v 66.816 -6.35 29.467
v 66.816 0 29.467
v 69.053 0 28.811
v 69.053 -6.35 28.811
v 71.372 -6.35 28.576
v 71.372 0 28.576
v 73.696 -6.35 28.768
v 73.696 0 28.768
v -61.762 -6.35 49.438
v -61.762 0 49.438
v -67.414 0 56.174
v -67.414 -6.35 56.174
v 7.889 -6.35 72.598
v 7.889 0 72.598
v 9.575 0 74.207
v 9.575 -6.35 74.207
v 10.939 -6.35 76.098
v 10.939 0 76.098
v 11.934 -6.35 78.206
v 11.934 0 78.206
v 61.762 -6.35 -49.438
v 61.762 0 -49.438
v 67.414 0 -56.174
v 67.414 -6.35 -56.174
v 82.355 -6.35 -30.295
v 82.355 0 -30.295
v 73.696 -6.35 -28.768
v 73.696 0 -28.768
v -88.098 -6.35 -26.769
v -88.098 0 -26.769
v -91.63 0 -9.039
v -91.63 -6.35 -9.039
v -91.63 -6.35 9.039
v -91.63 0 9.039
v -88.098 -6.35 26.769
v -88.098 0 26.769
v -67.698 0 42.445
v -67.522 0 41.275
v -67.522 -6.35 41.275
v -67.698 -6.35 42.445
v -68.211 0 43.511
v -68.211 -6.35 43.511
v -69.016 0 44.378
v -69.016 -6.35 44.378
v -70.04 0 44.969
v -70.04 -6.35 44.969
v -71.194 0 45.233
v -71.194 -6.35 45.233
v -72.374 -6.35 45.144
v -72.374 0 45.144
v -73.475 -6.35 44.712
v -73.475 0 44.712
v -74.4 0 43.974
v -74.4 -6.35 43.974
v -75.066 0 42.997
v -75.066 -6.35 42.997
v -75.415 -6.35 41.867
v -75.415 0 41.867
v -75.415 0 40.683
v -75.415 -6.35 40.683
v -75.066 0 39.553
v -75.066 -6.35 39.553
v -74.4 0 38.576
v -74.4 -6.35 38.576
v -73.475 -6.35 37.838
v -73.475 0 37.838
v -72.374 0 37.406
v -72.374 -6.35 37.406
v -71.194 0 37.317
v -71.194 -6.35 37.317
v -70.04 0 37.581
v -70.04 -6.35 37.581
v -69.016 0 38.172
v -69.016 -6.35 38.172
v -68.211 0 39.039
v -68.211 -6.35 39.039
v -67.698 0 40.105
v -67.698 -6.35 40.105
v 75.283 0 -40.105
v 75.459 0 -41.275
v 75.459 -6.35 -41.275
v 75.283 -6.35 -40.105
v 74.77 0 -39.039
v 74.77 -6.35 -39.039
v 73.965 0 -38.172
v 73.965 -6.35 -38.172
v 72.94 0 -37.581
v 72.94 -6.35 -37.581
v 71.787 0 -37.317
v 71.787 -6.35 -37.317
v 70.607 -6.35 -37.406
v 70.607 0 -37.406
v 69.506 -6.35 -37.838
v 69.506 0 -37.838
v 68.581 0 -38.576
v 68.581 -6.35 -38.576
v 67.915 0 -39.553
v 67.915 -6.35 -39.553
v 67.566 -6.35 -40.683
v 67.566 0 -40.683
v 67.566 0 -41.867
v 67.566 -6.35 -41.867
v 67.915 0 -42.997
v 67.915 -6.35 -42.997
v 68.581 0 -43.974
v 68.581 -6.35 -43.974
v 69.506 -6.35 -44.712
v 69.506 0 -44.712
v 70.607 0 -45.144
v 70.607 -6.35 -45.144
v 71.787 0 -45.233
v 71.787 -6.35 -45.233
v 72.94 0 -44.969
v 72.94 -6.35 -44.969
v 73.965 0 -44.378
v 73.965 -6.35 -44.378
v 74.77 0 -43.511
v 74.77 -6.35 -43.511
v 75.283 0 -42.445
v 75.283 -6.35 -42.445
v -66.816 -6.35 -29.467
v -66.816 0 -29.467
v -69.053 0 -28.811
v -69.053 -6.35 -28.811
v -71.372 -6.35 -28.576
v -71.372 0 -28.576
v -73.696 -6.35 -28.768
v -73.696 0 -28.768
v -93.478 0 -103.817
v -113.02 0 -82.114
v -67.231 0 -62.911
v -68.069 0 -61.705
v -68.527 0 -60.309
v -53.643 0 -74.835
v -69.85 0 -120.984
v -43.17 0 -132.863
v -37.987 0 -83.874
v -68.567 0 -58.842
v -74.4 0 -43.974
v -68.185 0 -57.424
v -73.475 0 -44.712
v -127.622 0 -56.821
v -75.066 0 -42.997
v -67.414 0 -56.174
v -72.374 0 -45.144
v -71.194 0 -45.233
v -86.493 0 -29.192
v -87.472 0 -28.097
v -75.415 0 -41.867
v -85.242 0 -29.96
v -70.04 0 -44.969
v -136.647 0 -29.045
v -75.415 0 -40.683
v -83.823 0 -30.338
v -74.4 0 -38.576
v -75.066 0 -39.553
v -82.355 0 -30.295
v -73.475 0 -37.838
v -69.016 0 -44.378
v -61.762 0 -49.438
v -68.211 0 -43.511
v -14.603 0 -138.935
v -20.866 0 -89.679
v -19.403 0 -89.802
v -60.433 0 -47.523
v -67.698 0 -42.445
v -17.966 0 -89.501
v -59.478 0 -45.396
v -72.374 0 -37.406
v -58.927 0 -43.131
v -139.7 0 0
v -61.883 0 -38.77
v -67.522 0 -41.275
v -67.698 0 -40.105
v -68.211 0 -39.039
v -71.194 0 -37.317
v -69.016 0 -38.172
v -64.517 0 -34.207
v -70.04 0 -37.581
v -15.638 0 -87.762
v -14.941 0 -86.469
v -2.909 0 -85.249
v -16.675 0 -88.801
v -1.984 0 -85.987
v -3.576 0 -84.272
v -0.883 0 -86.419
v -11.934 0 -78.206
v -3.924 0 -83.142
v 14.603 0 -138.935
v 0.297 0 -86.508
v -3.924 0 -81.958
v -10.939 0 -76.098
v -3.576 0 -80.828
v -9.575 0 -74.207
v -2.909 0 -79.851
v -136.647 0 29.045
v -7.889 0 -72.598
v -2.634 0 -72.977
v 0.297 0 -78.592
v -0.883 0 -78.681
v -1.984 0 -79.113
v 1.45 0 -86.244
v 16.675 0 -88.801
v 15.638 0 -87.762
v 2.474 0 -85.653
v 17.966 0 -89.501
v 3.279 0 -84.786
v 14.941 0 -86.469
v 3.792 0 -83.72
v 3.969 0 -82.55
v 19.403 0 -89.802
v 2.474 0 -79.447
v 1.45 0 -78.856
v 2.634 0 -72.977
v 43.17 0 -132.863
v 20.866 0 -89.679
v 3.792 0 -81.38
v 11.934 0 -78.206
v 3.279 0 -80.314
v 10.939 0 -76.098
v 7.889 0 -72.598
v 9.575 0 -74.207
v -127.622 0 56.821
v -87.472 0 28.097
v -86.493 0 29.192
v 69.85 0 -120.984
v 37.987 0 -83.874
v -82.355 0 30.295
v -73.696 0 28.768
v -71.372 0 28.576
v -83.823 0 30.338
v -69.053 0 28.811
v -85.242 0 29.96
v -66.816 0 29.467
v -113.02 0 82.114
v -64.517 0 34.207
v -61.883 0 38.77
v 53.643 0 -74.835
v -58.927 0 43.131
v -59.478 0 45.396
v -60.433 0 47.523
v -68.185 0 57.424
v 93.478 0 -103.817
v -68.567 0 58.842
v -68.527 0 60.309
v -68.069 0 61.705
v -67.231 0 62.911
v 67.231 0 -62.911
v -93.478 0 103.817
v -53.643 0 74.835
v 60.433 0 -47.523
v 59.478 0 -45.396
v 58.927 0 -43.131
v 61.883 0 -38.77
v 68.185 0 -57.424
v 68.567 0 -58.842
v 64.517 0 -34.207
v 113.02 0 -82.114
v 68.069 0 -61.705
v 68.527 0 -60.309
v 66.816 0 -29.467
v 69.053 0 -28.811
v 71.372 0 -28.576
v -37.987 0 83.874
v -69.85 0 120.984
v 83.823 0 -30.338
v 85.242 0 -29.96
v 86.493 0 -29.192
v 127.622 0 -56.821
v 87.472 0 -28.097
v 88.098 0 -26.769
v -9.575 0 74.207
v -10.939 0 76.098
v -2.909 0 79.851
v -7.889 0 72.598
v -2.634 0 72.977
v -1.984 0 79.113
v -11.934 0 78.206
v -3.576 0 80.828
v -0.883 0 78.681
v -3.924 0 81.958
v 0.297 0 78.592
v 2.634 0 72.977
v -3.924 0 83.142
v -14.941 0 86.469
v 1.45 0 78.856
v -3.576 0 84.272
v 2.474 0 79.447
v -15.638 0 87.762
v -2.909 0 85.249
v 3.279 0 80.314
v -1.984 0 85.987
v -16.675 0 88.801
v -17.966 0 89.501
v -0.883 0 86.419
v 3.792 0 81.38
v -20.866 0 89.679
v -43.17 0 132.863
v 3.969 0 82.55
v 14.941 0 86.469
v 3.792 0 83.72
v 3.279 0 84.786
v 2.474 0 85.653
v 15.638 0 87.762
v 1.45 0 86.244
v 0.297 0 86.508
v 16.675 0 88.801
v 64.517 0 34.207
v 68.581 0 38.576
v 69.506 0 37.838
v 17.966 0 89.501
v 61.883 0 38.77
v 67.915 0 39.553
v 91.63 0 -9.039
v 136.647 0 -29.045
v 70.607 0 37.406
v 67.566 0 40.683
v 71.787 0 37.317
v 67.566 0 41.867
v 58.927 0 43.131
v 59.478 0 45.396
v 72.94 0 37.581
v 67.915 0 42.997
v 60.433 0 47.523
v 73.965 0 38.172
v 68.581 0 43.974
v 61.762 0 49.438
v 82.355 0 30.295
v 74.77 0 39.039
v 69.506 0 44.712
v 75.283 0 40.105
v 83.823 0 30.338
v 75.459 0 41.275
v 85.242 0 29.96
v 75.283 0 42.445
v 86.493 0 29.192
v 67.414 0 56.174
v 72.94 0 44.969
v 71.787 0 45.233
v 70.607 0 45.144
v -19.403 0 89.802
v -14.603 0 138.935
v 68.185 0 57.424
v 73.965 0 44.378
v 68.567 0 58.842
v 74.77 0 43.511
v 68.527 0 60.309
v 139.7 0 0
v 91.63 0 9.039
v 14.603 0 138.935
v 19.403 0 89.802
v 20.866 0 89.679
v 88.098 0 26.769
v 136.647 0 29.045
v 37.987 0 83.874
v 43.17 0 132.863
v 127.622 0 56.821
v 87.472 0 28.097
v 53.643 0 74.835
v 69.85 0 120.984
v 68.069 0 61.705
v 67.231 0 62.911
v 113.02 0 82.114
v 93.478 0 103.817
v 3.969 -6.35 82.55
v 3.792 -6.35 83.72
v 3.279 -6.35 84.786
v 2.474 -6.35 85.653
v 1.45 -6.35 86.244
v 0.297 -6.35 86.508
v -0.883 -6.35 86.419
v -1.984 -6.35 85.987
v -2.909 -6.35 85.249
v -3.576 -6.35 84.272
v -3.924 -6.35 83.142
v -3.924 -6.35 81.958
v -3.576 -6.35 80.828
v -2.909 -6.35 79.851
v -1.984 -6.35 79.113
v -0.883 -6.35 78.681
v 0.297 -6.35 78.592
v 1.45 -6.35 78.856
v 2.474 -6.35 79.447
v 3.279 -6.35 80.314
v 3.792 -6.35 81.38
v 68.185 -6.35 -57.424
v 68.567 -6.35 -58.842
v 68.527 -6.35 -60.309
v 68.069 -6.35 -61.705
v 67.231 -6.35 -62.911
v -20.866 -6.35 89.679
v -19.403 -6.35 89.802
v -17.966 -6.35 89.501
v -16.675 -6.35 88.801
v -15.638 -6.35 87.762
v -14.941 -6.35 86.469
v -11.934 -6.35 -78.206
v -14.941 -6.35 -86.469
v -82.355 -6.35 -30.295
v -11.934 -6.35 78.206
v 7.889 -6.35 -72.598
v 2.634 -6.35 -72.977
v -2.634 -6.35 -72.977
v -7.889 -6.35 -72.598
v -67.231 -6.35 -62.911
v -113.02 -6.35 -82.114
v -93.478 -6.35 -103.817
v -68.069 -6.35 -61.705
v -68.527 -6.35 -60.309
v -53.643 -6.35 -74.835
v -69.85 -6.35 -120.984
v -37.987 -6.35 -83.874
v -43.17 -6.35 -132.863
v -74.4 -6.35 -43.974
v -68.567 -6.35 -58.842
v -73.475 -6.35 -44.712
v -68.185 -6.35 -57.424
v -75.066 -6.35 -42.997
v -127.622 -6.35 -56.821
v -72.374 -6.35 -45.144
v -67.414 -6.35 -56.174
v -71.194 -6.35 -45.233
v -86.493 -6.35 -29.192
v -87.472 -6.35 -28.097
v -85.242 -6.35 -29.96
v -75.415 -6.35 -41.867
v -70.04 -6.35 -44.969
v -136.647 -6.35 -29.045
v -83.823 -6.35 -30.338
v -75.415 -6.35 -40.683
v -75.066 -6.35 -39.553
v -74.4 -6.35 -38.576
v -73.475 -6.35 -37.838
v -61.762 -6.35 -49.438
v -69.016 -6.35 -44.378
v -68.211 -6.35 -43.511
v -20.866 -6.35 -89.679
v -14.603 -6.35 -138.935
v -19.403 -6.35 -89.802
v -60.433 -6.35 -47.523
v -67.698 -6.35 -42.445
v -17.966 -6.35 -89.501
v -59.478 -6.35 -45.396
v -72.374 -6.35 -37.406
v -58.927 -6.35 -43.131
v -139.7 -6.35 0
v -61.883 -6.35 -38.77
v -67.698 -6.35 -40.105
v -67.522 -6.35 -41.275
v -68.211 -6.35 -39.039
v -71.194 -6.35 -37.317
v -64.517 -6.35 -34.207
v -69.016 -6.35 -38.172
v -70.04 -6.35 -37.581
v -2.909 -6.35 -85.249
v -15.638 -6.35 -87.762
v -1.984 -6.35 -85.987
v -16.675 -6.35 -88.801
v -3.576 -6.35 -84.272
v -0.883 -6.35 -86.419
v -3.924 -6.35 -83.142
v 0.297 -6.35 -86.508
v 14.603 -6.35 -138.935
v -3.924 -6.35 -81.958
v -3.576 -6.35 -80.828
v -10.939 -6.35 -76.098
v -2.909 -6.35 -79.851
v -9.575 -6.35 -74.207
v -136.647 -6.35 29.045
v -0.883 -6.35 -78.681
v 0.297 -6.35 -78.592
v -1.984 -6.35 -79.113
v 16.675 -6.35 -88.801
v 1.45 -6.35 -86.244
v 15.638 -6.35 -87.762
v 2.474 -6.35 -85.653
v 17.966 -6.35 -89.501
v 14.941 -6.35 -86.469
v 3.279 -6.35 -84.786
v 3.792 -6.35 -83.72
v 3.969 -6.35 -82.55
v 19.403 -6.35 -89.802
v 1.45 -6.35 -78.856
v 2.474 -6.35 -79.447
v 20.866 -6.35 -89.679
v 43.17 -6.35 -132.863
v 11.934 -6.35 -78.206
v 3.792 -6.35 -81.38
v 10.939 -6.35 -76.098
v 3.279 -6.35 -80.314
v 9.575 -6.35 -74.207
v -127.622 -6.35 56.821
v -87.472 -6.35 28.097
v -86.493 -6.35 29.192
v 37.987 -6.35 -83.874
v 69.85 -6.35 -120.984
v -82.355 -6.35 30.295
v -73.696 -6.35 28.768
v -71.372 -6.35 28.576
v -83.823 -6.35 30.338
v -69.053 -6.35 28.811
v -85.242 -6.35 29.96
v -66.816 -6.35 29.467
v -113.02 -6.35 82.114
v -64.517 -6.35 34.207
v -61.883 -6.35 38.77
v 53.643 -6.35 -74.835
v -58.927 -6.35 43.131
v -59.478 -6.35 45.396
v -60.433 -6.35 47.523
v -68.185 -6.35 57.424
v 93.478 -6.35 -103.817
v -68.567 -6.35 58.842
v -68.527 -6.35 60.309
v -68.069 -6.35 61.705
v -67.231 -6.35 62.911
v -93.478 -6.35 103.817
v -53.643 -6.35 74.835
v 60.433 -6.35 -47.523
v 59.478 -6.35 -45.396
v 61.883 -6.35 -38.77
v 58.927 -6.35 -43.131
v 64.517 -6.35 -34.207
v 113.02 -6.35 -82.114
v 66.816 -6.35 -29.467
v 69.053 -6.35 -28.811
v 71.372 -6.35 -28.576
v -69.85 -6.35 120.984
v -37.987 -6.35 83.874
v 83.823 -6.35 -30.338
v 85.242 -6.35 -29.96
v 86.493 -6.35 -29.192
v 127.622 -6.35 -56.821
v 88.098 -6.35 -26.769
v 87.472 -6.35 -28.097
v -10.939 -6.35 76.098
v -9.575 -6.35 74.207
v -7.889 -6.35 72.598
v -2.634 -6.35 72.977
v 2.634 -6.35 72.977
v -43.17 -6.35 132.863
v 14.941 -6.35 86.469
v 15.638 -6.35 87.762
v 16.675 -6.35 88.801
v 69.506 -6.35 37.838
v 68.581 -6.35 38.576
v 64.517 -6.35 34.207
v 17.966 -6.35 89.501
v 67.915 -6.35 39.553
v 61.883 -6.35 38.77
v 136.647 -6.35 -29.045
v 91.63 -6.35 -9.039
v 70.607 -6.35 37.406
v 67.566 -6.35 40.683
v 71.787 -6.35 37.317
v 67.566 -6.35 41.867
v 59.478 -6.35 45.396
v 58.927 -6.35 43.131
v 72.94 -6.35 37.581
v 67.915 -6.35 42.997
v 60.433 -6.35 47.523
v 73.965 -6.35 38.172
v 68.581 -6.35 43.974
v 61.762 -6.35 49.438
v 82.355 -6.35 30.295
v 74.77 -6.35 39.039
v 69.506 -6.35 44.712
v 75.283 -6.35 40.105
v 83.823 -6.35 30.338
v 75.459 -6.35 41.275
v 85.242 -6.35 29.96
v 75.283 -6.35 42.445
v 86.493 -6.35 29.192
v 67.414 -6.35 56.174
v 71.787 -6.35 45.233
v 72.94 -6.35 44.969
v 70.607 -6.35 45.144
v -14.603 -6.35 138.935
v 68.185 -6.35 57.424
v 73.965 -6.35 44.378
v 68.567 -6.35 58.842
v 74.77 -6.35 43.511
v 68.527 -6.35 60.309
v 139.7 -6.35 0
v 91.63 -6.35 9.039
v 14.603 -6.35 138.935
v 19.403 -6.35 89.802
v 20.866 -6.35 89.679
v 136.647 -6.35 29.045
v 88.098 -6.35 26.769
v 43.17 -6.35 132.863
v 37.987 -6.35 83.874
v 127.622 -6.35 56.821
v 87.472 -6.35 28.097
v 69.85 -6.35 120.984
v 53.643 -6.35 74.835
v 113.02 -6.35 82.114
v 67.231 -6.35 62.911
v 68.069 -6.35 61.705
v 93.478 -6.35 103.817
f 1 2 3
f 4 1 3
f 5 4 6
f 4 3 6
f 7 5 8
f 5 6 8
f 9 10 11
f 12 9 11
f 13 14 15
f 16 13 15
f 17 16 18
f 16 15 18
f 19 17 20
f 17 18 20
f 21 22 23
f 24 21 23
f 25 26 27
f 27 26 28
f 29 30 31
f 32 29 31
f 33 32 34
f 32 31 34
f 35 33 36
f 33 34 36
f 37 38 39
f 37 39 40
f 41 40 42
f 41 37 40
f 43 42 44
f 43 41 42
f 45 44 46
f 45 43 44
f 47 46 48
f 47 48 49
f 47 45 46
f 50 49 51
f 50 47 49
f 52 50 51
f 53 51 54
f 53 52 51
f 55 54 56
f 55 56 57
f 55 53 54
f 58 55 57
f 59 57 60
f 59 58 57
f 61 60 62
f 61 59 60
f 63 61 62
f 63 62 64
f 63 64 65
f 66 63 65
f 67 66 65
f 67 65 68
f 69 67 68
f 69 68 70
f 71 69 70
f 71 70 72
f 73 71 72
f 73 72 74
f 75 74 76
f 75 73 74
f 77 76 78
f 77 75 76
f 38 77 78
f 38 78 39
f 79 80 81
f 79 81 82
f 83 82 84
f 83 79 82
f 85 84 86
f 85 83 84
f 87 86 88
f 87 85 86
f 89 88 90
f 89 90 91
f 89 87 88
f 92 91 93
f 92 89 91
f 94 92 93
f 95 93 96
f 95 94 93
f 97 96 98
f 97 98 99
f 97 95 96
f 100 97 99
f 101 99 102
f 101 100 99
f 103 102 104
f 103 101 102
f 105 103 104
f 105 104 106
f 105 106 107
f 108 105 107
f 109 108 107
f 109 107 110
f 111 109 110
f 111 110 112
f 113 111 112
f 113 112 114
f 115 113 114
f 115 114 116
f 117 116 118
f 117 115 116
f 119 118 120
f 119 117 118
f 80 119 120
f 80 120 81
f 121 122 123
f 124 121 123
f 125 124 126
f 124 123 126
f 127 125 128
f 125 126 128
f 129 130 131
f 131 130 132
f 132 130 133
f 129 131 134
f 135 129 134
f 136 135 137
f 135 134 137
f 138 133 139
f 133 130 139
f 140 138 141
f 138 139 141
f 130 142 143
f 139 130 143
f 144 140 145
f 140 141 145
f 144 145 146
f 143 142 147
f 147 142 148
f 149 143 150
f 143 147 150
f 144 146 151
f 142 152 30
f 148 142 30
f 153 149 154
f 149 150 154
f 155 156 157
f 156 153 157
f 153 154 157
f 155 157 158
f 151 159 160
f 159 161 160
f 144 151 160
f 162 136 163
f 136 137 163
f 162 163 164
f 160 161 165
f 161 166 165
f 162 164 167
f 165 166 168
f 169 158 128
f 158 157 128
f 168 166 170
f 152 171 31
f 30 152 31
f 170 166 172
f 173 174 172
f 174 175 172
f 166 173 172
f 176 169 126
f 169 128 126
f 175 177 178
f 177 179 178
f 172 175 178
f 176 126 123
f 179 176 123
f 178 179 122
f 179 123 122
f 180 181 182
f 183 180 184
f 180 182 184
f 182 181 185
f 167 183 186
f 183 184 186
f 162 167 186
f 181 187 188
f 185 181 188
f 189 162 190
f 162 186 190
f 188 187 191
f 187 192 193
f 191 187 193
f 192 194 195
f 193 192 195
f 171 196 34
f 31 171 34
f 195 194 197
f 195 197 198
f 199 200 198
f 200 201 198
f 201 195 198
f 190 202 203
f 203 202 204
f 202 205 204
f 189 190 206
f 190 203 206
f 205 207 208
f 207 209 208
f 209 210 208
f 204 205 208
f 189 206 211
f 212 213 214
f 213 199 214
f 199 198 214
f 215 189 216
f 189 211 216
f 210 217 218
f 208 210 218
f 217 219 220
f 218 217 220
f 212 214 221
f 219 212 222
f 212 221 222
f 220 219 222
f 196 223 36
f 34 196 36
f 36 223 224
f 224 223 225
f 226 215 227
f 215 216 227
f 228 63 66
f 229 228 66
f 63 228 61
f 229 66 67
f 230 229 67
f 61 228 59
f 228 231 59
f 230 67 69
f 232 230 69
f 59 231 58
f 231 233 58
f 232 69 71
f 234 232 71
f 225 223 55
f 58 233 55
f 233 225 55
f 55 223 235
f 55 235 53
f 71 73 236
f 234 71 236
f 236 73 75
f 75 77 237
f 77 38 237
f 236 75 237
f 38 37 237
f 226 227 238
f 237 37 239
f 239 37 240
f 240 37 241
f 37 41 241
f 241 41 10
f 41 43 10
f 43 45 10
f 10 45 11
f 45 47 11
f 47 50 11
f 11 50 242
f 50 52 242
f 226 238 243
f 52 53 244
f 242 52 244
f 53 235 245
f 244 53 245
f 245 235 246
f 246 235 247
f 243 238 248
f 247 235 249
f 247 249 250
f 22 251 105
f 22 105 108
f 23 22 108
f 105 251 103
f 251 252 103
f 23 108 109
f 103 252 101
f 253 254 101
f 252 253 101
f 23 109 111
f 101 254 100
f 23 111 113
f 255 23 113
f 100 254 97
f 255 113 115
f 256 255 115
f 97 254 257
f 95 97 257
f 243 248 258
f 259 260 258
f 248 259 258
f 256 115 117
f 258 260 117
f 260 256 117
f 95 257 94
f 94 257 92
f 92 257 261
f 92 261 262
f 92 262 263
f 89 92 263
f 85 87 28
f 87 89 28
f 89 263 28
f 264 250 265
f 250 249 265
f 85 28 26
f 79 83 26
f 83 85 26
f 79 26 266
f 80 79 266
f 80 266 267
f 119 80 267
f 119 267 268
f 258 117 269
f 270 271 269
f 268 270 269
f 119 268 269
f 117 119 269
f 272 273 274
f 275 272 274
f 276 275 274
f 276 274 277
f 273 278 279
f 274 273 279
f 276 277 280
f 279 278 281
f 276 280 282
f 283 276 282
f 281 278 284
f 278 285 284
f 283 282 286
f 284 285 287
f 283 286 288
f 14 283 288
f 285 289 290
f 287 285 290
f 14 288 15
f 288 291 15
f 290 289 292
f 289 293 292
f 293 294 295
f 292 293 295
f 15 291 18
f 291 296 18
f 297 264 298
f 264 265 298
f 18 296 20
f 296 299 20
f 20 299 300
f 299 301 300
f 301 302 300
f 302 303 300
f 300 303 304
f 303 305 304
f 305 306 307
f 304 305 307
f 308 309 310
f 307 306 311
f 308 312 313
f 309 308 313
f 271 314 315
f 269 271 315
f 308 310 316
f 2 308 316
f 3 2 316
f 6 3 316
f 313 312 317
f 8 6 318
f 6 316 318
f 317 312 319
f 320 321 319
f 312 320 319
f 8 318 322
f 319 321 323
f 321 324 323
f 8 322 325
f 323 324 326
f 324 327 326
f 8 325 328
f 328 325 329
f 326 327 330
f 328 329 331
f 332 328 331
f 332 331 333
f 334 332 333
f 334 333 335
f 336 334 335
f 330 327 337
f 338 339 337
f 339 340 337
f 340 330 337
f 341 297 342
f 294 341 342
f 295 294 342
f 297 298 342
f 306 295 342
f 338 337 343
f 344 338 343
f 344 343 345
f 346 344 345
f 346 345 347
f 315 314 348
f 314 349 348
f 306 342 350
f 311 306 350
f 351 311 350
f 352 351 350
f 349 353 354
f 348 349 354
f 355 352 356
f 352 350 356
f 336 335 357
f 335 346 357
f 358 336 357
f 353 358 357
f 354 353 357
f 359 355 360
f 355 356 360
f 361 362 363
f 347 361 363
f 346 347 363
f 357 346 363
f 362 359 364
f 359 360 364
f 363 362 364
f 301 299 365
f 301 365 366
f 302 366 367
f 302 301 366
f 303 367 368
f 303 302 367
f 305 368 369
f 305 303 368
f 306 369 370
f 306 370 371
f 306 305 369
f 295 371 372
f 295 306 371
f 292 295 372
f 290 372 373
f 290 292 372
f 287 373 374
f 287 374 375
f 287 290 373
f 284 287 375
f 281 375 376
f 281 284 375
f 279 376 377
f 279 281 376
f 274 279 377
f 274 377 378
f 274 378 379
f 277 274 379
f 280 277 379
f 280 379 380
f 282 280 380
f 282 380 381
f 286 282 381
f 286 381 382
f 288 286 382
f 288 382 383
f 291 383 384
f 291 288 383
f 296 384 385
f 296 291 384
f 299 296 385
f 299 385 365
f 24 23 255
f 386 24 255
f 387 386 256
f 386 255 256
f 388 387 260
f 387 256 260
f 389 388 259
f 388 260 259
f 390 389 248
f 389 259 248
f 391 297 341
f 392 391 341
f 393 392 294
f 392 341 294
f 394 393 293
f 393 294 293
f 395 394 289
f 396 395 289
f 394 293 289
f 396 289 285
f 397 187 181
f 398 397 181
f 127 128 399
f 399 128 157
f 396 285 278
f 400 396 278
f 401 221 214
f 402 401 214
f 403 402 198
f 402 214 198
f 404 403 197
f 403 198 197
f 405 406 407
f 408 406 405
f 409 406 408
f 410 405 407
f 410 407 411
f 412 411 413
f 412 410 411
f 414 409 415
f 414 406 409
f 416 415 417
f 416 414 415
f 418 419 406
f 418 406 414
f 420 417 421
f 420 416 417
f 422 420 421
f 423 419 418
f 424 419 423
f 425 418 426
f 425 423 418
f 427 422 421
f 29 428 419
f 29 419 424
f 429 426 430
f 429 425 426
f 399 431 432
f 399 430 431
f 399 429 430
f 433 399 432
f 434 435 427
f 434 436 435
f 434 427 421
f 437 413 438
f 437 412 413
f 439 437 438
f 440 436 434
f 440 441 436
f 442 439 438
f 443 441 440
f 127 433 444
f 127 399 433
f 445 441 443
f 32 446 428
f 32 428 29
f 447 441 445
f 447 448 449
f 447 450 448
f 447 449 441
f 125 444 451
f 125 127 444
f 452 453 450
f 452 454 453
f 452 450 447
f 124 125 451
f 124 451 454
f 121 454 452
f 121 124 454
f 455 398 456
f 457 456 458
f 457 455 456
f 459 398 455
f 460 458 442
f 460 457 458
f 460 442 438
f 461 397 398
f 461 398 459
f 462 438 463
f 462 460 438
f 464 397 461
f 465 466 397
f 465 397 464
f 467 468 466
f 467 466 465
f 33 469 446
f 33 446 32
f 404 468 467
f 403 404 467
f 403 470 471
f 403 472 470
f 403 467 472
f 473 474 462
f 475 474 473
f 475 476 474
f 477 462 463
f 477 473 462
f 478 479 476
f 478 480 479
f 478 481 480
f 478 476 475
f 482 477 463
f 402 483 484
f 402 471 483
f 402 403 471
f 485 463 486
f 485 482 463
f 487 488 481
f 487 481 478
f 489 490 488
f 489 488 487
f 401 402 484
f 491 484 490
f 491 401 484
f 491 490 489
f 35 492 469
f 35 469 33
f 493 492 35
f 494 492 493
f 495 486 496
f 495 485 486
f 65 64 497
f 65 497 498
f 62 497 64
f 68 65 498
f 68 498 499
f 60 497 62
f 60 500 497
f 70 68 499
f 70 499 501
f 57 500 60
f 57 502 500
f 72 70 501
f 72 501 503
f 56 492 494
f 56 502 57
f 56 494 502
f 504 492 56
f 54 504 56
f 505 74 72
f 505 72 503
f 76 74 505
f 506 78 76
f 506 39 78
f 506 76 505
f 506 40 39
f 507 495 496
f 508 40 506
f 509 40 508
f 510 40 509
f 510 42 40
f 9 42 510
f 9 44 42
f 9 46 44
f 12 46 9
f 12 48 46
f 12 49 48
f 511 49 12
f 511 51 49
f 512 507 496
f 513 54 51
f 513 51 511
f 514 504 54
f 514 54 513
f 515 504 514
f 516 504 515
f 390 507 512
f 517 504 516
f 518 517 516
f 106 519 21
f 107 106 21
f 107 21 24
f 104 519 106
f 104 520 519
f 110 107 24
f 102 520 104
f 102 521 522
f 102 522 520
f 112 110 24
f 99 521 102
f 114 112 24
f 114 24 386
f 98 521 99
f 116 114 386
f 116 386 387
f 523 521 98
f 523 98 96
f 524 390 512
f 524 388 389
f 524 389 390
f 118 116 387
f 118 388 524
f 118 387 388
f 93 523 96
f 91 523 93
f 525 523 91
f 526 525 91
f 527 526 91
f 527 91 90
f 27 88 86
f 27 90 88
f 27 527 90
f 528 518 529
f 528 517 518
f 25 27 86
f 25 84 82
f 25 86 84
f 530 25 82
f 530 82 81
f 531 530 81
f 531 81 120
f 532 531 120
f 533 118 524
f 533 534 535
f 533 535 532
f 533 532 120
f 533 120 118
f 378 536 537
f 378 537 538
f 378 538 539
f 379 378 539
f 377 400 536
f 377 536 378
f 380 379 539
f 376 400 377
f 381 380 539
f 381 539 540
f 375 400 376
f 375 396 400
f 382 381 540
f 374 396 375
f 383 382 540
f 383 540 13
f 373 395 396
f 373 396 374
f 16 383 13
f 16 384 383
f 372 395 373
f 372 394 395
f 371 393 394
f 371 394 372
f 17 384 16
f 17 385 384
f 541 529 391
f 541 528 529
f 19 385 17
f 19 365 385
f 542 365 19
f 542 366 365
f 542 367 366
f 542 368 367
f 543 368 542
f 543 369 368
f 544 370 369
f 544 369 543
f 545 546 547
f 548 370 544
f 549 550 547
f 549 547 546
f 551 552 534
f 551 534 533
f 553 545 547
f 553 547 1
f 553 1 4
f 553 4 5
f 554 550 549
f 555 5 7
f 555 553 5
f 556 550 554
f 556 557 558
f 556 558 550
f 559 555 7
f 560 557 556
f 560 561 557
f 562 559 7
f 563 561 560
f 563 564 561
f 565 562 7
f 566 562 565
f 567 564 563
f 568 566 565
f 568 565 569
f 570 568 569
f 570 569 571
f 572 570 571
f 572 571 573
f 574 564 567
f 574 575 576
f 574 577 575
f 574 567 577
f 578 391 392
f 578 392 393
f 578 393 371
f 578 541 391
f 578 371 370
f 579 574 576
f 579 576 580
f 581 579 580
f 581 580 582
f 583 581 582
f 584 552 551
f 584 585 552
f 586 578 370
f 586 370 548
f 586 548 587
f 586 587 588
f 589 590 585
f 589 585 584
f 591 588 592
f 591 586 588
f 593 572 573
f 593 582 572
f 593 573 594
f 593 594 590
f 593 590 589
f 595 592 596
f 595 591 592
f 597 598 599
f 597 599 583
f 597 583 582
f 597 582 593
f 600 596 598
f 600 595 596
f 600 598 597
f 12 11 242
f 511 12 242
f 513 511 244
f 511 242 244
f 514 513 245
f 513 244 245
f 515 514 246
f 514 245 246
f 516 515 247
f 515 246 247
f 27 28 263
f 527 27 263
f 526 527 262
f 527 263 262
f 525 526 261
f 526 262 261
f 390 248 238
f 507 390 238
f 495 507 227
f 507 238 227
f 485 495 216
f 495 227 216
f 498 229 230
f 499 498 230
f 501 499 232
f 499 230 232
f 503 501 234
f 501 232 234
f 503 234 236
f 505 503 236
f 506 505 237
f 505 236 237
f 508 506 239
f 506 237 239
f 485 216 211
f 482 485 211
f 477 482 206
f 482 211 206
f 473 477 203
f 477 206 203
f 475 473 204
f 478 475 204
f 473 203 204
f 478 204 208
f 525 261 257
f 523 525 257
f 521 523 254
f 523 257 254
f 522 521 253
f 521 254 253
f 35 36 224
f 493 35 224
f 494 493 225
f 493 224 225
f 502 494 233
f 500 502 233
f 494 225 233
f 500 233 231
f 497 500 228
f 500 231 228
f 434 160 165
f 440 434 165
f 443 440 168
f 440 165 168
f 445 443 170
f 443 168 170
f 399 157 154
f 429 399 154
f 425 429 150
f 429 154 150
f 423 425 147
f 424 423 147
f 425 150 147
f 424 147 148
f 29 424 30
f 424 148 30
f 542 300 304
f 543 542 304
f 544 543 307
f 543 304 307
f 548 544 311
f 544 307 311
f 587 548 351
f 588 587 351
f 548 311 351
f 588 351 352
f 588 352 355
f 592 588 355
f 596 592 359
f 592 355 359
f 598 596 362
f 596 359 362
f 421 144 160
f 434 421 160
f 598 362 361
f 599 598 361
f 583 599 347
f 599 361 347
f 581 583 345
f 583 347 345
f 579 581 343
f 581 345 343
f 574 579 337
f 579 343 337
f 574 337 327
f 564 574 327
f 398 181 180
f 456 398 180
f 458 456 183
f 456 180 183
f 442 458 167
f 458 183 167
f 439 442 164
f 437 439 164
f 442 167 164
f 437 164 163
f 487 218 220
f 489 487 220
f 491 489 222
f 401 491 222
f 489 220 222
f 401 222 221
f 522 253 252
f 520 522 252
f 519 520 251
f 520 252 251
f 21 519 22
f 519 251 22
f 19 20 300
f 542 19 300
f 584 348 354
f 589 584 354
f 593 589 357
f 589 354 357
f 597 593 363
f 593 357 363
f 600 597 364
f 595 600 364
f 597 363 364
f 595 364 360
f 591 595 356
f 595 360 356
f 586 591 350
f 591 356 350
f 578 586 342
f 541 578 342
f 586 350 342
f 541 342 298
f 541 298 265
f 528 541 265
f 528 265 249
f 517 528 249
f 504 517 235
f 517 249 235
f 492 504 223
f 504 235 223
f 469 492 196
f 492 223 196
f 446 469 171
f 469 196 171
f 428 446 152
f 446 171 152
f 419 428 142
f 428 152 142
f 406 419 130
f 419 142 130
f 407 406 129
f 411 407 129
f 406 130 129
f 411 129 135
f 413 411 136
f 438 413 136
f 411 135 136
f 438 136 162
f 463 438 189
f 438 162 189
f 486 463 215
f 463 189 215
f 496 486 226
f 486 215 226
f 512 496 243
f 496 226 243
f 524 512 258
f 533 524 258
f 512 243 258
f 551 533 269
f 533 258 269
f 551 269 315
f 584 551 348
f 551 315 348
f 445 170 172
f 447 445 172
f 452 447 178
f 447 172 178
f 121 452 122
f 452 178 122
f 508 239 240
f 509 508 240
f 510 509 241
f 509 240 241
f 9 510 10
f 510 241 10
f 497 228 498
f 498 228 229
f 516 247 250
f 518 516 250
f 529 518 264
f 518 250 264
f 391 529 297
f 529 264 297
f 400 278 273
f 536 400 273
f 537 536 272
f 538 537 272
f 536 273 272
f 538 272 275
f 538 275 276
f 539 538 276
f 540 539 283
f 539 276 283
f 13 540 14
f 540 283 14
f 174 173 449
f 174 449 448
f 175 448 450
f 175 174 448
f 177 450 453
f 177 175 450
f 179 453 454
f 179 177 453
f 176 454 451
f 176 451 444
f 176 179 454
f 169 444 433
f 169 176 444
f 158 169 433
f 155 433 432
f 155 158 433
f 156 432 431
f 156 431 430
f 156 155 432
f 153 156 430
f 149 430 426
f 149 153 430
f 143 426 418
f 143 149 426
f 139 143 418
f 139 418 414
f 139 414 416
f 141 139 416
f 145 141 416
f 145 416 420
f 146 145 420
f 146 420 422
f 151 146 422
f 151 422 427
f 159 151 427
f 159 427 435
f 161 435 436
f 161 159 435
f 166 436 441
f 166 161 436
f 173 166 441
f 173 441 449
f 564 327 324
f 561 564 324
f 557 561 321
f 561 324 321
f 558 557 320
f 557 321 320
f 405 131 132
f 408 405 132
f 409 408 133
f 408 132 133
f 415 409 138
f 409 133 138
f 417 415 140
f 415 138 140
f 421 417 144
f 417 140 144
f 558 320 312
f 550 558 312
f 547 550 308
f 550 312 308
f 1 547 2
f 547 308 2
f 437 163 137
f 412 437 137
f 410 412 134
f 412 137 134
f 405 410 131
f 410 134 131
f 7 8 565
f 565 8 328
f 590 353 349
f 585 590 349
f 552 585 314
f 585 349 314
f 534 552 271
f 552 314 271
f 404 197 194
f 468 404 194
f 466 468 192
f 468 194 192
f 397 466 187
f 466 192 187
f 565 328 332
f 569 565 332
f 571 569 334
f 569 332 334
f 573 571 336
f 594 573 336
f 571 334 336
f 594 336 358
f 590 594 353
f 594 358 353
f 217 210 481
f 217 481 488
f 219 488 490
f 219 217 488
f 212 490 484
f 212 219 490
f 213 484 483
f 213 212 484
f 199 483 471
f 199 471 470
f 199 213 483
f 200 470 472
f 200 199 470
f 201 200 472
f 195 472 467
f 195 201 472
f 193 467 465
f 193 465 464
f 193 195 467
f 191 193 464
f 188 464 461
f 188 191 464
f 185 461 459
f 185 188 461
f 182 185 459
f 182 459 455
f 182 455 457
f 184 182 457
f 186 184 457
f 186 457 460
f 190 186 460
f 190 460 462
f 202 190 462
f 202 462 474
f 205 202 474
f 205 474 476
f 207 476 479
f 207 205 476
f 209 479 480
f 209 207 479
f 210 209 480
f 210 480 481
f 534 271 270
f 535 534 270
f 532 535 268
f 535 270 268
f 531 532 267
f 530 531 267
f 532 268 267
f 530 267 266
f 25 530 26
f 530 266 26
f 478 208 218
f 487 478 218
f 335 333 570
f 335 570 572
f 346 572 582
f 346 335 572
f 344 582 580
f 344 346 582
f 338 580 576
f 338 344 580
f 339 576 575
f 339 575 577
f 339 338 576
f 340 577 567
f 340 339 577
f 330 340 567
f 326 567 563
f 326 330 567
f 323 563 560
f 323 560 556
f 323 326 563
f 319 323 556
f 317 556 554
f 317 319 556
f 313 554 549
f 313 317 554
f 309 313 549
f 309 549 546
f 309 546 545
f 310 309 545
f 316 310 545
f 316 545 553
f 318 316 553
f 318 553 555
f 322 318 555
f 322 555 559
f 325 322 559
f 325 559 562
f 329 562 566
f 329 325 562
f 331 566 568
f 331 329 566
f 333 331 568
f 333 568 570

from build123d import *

# Parameters (mm, degrees)
F0_R     = 139.7
F0_R_2   = 3.96875
F1_DEPTH = 6.35


with BuildPart() as f1:
    # F0 (on Front) → F1 (new body)
    with BuildSketch(Plane.XZ):
        Circle(F0_R)
        with Locations((-71.490397, -41.275)):
            Circle(F0_R_2, mode=Mode.SUBTRACT)
        with Locations((0, -82.55)):
            Circle(F0_R_2, mode=Mode.SUBTRACT)
        with Locations((71.490397, -41.275)):
            Circle(F0_R_2, mode=Mode.SUBTRACT)
        with Locations((-71.490397, 41.275)):
            Circle(F0_R_2, mode=Mode.SUBTRACT)
        with BuildLine():
            ThreePointArc((-67.231483, 62.910519), (-46.0375, 79.739289), (-20.866366, 89.679431))
            ThreePointArc((-20.866366, 89.679431), (-17.294985, 89.198071), (-14.94148, 86.469063))
            Line((-14.94148, 86.469063), (-11.934096, 78.206344))
            ThreePointArc((-11.934096, 78.206344), (-10.300747, 75.121366), (-7.889211, 72.597596))
            ThreePointArc((-7.889211, 72.597596), (0, 73.025), (7.889211, 72.597596))
            ThreePointArc((7.889211, 72.597596), (10.300747, 75.121366), (11.934096, 78.206344))
            Line((11.934096, 78.206344), (14.94148, 86.469063))
            ThreePointArc((14.94148, 86.469063), (17.294985, 89.198071), (20.866366, 89.679431))
            ThreePointArc((20.866366, 89.679431), (46.0375, 79.739289), (67.231483, 62.910519))
            ThreePointArc((67.231483, 62.910519), (68.600303, 59.576932), (67.413665, 56.174233))
            Line((67.413665, 56.174233), (61.761633, 49.438403))
            ThreePointArc((61.761633, 49.438403), (59.906638, 46.481392), (58.926757, 43.131056))
            ThreePointArc((58.926757, 43.131056), (63.241505, 36.5125), (66.815968, 29.466541))
            ThreePointArc((66.815968, 29.466541), (70.207385, 28.639974), (73.695729, 28.767942))
            Line((73.695729, 28.767942), (82.355145, 30.29483))
            ThreePointArc((82.355145, 30.29483), (85.895288, 29.621139), (88.097849, 26.768912))
            ThreePointArc((88.097849, 26.768912), (92.075, 0), (88.097849, -26.768912))
            ThreePointArc((88.097849, -26.768912), (85.895288, -29.621139), (82.355145, -30.29483))
            Line((82.355145, -30.29483), (73.695729, -28.767942))
            ThreePointArc((73.695729, -28.767942), (70.207385, -28.639974), (66.815968, -29.466541))
            ThreePointArc((66.815968, -29.466541), (63.241505, -36.5125), (58.926757, -43.131056))
            ThreePointArc((58.926757, -43.131056), (59.906638, -46.481392), (61.761633, -49.438403))
            Line((61.761633, -49.438403), (67.413665, -56.174233))
            ThreePointArc((67.413665, -56.174233), (68.600303, -59.576932), (67.231483, -62.910519))
            ThreePointArc((67.231483, -62.910519), (46.0375, -79.739289), (20.866366, -89.679431))
            ThreePointArc((20.866366, -89.679431), (17.294985, -89.198071), (14.94148, -86.469063))
            Line((14.94148, -86.469063), (11.934096, -78.206344))
            ThreePointArc((11.934096, -78.206344), (10.300747, -75.121366), (7.889211, -72.597596))
            ThreePointArc((7.889211, -72.597596), (0, -73.025), (-7.889211, -72.597596))
            ThreePointArc((-7.889211, -72.597596), (-10.300747, -75.121366), (-11.934096, -78.206344))
            Line((-11.934096, -78.206344), (-14.94148, -86.469063))
            ThreePointArc((-14.94148, -86.469063), (-17.294985, -89.198071), (-20.866366, -89.679431))
            ThreePointArc((-20.866366, -89.679431), (-46.0375, -79.739289), (-67.231483, -62.910519))
            ThreePointArc((-67.231483, -62.910519), (-68.600303, -59.576932), (-67.413665, -56.174233))
            Line((-67.413665, -56.174233), (-61.761633, -49.438403))
            ThreePointArc((-61.761633, -49.438403), (-59.906638, -46.481392), (-58.926757, -43.131056))
            ThreePointArc((-58.926757, -43.131056), (-63.241505, -36.5125), (-66.815968, -29.466541))
            ThreePointArc((-66.815968, -29.466541), (-70.207385, -28.639974), (-73.695729, -28.767942))
            Line((-73.695729, -28.767942), (-82.355145, -30.29483))
            ThreePointArc((-82.355145, -30.29483), (-85.895288, -29.621139), (-88.097849, -26.768912))
            ThreePointArc((-88.097849, -26.768912), (-92.075, 0), (-88.097849, 26.768912))
            ThreePointArc((-88.097849, 26.768912), (-85.895288, 29.621139), (-82.355145, 30.29483))
            Line((-82.355145, 30.29483), (-73.695729, 28.767942))
            ThreePointArc((-73.695729, 28.767942), (-70.207385, 28.639974), (-66.815968, 29.466541))
            ThreePointArc((-66.815968, 29.466541), (-63.241505, 36.5125), (-58.926757, 43.131056))
            ThreePointArc((-58.926757, 43.131056), (-59.906638, 46.481392), (-61.761633, 49.438403))
            Line((-61.761633, 49.438403), (-67.413665, 56.174233))
            ThreePointArc((-67.413665, 56.174233), (-68.600303, 59.576932), (-67.231483, 62.910519))
        make_face(mode=Mode.SUBTRACT)
        with Locations((71.490397, 41.275)):
            Circle(F0_R_2, mode=Mode.SUBTRACT)
        with Locations((0, 82.55)):
            Circle(F0_R_2, mode=Mode.SUBTRACT)
    extrude(amount=F1_DEPTH)


solid = f1.part
